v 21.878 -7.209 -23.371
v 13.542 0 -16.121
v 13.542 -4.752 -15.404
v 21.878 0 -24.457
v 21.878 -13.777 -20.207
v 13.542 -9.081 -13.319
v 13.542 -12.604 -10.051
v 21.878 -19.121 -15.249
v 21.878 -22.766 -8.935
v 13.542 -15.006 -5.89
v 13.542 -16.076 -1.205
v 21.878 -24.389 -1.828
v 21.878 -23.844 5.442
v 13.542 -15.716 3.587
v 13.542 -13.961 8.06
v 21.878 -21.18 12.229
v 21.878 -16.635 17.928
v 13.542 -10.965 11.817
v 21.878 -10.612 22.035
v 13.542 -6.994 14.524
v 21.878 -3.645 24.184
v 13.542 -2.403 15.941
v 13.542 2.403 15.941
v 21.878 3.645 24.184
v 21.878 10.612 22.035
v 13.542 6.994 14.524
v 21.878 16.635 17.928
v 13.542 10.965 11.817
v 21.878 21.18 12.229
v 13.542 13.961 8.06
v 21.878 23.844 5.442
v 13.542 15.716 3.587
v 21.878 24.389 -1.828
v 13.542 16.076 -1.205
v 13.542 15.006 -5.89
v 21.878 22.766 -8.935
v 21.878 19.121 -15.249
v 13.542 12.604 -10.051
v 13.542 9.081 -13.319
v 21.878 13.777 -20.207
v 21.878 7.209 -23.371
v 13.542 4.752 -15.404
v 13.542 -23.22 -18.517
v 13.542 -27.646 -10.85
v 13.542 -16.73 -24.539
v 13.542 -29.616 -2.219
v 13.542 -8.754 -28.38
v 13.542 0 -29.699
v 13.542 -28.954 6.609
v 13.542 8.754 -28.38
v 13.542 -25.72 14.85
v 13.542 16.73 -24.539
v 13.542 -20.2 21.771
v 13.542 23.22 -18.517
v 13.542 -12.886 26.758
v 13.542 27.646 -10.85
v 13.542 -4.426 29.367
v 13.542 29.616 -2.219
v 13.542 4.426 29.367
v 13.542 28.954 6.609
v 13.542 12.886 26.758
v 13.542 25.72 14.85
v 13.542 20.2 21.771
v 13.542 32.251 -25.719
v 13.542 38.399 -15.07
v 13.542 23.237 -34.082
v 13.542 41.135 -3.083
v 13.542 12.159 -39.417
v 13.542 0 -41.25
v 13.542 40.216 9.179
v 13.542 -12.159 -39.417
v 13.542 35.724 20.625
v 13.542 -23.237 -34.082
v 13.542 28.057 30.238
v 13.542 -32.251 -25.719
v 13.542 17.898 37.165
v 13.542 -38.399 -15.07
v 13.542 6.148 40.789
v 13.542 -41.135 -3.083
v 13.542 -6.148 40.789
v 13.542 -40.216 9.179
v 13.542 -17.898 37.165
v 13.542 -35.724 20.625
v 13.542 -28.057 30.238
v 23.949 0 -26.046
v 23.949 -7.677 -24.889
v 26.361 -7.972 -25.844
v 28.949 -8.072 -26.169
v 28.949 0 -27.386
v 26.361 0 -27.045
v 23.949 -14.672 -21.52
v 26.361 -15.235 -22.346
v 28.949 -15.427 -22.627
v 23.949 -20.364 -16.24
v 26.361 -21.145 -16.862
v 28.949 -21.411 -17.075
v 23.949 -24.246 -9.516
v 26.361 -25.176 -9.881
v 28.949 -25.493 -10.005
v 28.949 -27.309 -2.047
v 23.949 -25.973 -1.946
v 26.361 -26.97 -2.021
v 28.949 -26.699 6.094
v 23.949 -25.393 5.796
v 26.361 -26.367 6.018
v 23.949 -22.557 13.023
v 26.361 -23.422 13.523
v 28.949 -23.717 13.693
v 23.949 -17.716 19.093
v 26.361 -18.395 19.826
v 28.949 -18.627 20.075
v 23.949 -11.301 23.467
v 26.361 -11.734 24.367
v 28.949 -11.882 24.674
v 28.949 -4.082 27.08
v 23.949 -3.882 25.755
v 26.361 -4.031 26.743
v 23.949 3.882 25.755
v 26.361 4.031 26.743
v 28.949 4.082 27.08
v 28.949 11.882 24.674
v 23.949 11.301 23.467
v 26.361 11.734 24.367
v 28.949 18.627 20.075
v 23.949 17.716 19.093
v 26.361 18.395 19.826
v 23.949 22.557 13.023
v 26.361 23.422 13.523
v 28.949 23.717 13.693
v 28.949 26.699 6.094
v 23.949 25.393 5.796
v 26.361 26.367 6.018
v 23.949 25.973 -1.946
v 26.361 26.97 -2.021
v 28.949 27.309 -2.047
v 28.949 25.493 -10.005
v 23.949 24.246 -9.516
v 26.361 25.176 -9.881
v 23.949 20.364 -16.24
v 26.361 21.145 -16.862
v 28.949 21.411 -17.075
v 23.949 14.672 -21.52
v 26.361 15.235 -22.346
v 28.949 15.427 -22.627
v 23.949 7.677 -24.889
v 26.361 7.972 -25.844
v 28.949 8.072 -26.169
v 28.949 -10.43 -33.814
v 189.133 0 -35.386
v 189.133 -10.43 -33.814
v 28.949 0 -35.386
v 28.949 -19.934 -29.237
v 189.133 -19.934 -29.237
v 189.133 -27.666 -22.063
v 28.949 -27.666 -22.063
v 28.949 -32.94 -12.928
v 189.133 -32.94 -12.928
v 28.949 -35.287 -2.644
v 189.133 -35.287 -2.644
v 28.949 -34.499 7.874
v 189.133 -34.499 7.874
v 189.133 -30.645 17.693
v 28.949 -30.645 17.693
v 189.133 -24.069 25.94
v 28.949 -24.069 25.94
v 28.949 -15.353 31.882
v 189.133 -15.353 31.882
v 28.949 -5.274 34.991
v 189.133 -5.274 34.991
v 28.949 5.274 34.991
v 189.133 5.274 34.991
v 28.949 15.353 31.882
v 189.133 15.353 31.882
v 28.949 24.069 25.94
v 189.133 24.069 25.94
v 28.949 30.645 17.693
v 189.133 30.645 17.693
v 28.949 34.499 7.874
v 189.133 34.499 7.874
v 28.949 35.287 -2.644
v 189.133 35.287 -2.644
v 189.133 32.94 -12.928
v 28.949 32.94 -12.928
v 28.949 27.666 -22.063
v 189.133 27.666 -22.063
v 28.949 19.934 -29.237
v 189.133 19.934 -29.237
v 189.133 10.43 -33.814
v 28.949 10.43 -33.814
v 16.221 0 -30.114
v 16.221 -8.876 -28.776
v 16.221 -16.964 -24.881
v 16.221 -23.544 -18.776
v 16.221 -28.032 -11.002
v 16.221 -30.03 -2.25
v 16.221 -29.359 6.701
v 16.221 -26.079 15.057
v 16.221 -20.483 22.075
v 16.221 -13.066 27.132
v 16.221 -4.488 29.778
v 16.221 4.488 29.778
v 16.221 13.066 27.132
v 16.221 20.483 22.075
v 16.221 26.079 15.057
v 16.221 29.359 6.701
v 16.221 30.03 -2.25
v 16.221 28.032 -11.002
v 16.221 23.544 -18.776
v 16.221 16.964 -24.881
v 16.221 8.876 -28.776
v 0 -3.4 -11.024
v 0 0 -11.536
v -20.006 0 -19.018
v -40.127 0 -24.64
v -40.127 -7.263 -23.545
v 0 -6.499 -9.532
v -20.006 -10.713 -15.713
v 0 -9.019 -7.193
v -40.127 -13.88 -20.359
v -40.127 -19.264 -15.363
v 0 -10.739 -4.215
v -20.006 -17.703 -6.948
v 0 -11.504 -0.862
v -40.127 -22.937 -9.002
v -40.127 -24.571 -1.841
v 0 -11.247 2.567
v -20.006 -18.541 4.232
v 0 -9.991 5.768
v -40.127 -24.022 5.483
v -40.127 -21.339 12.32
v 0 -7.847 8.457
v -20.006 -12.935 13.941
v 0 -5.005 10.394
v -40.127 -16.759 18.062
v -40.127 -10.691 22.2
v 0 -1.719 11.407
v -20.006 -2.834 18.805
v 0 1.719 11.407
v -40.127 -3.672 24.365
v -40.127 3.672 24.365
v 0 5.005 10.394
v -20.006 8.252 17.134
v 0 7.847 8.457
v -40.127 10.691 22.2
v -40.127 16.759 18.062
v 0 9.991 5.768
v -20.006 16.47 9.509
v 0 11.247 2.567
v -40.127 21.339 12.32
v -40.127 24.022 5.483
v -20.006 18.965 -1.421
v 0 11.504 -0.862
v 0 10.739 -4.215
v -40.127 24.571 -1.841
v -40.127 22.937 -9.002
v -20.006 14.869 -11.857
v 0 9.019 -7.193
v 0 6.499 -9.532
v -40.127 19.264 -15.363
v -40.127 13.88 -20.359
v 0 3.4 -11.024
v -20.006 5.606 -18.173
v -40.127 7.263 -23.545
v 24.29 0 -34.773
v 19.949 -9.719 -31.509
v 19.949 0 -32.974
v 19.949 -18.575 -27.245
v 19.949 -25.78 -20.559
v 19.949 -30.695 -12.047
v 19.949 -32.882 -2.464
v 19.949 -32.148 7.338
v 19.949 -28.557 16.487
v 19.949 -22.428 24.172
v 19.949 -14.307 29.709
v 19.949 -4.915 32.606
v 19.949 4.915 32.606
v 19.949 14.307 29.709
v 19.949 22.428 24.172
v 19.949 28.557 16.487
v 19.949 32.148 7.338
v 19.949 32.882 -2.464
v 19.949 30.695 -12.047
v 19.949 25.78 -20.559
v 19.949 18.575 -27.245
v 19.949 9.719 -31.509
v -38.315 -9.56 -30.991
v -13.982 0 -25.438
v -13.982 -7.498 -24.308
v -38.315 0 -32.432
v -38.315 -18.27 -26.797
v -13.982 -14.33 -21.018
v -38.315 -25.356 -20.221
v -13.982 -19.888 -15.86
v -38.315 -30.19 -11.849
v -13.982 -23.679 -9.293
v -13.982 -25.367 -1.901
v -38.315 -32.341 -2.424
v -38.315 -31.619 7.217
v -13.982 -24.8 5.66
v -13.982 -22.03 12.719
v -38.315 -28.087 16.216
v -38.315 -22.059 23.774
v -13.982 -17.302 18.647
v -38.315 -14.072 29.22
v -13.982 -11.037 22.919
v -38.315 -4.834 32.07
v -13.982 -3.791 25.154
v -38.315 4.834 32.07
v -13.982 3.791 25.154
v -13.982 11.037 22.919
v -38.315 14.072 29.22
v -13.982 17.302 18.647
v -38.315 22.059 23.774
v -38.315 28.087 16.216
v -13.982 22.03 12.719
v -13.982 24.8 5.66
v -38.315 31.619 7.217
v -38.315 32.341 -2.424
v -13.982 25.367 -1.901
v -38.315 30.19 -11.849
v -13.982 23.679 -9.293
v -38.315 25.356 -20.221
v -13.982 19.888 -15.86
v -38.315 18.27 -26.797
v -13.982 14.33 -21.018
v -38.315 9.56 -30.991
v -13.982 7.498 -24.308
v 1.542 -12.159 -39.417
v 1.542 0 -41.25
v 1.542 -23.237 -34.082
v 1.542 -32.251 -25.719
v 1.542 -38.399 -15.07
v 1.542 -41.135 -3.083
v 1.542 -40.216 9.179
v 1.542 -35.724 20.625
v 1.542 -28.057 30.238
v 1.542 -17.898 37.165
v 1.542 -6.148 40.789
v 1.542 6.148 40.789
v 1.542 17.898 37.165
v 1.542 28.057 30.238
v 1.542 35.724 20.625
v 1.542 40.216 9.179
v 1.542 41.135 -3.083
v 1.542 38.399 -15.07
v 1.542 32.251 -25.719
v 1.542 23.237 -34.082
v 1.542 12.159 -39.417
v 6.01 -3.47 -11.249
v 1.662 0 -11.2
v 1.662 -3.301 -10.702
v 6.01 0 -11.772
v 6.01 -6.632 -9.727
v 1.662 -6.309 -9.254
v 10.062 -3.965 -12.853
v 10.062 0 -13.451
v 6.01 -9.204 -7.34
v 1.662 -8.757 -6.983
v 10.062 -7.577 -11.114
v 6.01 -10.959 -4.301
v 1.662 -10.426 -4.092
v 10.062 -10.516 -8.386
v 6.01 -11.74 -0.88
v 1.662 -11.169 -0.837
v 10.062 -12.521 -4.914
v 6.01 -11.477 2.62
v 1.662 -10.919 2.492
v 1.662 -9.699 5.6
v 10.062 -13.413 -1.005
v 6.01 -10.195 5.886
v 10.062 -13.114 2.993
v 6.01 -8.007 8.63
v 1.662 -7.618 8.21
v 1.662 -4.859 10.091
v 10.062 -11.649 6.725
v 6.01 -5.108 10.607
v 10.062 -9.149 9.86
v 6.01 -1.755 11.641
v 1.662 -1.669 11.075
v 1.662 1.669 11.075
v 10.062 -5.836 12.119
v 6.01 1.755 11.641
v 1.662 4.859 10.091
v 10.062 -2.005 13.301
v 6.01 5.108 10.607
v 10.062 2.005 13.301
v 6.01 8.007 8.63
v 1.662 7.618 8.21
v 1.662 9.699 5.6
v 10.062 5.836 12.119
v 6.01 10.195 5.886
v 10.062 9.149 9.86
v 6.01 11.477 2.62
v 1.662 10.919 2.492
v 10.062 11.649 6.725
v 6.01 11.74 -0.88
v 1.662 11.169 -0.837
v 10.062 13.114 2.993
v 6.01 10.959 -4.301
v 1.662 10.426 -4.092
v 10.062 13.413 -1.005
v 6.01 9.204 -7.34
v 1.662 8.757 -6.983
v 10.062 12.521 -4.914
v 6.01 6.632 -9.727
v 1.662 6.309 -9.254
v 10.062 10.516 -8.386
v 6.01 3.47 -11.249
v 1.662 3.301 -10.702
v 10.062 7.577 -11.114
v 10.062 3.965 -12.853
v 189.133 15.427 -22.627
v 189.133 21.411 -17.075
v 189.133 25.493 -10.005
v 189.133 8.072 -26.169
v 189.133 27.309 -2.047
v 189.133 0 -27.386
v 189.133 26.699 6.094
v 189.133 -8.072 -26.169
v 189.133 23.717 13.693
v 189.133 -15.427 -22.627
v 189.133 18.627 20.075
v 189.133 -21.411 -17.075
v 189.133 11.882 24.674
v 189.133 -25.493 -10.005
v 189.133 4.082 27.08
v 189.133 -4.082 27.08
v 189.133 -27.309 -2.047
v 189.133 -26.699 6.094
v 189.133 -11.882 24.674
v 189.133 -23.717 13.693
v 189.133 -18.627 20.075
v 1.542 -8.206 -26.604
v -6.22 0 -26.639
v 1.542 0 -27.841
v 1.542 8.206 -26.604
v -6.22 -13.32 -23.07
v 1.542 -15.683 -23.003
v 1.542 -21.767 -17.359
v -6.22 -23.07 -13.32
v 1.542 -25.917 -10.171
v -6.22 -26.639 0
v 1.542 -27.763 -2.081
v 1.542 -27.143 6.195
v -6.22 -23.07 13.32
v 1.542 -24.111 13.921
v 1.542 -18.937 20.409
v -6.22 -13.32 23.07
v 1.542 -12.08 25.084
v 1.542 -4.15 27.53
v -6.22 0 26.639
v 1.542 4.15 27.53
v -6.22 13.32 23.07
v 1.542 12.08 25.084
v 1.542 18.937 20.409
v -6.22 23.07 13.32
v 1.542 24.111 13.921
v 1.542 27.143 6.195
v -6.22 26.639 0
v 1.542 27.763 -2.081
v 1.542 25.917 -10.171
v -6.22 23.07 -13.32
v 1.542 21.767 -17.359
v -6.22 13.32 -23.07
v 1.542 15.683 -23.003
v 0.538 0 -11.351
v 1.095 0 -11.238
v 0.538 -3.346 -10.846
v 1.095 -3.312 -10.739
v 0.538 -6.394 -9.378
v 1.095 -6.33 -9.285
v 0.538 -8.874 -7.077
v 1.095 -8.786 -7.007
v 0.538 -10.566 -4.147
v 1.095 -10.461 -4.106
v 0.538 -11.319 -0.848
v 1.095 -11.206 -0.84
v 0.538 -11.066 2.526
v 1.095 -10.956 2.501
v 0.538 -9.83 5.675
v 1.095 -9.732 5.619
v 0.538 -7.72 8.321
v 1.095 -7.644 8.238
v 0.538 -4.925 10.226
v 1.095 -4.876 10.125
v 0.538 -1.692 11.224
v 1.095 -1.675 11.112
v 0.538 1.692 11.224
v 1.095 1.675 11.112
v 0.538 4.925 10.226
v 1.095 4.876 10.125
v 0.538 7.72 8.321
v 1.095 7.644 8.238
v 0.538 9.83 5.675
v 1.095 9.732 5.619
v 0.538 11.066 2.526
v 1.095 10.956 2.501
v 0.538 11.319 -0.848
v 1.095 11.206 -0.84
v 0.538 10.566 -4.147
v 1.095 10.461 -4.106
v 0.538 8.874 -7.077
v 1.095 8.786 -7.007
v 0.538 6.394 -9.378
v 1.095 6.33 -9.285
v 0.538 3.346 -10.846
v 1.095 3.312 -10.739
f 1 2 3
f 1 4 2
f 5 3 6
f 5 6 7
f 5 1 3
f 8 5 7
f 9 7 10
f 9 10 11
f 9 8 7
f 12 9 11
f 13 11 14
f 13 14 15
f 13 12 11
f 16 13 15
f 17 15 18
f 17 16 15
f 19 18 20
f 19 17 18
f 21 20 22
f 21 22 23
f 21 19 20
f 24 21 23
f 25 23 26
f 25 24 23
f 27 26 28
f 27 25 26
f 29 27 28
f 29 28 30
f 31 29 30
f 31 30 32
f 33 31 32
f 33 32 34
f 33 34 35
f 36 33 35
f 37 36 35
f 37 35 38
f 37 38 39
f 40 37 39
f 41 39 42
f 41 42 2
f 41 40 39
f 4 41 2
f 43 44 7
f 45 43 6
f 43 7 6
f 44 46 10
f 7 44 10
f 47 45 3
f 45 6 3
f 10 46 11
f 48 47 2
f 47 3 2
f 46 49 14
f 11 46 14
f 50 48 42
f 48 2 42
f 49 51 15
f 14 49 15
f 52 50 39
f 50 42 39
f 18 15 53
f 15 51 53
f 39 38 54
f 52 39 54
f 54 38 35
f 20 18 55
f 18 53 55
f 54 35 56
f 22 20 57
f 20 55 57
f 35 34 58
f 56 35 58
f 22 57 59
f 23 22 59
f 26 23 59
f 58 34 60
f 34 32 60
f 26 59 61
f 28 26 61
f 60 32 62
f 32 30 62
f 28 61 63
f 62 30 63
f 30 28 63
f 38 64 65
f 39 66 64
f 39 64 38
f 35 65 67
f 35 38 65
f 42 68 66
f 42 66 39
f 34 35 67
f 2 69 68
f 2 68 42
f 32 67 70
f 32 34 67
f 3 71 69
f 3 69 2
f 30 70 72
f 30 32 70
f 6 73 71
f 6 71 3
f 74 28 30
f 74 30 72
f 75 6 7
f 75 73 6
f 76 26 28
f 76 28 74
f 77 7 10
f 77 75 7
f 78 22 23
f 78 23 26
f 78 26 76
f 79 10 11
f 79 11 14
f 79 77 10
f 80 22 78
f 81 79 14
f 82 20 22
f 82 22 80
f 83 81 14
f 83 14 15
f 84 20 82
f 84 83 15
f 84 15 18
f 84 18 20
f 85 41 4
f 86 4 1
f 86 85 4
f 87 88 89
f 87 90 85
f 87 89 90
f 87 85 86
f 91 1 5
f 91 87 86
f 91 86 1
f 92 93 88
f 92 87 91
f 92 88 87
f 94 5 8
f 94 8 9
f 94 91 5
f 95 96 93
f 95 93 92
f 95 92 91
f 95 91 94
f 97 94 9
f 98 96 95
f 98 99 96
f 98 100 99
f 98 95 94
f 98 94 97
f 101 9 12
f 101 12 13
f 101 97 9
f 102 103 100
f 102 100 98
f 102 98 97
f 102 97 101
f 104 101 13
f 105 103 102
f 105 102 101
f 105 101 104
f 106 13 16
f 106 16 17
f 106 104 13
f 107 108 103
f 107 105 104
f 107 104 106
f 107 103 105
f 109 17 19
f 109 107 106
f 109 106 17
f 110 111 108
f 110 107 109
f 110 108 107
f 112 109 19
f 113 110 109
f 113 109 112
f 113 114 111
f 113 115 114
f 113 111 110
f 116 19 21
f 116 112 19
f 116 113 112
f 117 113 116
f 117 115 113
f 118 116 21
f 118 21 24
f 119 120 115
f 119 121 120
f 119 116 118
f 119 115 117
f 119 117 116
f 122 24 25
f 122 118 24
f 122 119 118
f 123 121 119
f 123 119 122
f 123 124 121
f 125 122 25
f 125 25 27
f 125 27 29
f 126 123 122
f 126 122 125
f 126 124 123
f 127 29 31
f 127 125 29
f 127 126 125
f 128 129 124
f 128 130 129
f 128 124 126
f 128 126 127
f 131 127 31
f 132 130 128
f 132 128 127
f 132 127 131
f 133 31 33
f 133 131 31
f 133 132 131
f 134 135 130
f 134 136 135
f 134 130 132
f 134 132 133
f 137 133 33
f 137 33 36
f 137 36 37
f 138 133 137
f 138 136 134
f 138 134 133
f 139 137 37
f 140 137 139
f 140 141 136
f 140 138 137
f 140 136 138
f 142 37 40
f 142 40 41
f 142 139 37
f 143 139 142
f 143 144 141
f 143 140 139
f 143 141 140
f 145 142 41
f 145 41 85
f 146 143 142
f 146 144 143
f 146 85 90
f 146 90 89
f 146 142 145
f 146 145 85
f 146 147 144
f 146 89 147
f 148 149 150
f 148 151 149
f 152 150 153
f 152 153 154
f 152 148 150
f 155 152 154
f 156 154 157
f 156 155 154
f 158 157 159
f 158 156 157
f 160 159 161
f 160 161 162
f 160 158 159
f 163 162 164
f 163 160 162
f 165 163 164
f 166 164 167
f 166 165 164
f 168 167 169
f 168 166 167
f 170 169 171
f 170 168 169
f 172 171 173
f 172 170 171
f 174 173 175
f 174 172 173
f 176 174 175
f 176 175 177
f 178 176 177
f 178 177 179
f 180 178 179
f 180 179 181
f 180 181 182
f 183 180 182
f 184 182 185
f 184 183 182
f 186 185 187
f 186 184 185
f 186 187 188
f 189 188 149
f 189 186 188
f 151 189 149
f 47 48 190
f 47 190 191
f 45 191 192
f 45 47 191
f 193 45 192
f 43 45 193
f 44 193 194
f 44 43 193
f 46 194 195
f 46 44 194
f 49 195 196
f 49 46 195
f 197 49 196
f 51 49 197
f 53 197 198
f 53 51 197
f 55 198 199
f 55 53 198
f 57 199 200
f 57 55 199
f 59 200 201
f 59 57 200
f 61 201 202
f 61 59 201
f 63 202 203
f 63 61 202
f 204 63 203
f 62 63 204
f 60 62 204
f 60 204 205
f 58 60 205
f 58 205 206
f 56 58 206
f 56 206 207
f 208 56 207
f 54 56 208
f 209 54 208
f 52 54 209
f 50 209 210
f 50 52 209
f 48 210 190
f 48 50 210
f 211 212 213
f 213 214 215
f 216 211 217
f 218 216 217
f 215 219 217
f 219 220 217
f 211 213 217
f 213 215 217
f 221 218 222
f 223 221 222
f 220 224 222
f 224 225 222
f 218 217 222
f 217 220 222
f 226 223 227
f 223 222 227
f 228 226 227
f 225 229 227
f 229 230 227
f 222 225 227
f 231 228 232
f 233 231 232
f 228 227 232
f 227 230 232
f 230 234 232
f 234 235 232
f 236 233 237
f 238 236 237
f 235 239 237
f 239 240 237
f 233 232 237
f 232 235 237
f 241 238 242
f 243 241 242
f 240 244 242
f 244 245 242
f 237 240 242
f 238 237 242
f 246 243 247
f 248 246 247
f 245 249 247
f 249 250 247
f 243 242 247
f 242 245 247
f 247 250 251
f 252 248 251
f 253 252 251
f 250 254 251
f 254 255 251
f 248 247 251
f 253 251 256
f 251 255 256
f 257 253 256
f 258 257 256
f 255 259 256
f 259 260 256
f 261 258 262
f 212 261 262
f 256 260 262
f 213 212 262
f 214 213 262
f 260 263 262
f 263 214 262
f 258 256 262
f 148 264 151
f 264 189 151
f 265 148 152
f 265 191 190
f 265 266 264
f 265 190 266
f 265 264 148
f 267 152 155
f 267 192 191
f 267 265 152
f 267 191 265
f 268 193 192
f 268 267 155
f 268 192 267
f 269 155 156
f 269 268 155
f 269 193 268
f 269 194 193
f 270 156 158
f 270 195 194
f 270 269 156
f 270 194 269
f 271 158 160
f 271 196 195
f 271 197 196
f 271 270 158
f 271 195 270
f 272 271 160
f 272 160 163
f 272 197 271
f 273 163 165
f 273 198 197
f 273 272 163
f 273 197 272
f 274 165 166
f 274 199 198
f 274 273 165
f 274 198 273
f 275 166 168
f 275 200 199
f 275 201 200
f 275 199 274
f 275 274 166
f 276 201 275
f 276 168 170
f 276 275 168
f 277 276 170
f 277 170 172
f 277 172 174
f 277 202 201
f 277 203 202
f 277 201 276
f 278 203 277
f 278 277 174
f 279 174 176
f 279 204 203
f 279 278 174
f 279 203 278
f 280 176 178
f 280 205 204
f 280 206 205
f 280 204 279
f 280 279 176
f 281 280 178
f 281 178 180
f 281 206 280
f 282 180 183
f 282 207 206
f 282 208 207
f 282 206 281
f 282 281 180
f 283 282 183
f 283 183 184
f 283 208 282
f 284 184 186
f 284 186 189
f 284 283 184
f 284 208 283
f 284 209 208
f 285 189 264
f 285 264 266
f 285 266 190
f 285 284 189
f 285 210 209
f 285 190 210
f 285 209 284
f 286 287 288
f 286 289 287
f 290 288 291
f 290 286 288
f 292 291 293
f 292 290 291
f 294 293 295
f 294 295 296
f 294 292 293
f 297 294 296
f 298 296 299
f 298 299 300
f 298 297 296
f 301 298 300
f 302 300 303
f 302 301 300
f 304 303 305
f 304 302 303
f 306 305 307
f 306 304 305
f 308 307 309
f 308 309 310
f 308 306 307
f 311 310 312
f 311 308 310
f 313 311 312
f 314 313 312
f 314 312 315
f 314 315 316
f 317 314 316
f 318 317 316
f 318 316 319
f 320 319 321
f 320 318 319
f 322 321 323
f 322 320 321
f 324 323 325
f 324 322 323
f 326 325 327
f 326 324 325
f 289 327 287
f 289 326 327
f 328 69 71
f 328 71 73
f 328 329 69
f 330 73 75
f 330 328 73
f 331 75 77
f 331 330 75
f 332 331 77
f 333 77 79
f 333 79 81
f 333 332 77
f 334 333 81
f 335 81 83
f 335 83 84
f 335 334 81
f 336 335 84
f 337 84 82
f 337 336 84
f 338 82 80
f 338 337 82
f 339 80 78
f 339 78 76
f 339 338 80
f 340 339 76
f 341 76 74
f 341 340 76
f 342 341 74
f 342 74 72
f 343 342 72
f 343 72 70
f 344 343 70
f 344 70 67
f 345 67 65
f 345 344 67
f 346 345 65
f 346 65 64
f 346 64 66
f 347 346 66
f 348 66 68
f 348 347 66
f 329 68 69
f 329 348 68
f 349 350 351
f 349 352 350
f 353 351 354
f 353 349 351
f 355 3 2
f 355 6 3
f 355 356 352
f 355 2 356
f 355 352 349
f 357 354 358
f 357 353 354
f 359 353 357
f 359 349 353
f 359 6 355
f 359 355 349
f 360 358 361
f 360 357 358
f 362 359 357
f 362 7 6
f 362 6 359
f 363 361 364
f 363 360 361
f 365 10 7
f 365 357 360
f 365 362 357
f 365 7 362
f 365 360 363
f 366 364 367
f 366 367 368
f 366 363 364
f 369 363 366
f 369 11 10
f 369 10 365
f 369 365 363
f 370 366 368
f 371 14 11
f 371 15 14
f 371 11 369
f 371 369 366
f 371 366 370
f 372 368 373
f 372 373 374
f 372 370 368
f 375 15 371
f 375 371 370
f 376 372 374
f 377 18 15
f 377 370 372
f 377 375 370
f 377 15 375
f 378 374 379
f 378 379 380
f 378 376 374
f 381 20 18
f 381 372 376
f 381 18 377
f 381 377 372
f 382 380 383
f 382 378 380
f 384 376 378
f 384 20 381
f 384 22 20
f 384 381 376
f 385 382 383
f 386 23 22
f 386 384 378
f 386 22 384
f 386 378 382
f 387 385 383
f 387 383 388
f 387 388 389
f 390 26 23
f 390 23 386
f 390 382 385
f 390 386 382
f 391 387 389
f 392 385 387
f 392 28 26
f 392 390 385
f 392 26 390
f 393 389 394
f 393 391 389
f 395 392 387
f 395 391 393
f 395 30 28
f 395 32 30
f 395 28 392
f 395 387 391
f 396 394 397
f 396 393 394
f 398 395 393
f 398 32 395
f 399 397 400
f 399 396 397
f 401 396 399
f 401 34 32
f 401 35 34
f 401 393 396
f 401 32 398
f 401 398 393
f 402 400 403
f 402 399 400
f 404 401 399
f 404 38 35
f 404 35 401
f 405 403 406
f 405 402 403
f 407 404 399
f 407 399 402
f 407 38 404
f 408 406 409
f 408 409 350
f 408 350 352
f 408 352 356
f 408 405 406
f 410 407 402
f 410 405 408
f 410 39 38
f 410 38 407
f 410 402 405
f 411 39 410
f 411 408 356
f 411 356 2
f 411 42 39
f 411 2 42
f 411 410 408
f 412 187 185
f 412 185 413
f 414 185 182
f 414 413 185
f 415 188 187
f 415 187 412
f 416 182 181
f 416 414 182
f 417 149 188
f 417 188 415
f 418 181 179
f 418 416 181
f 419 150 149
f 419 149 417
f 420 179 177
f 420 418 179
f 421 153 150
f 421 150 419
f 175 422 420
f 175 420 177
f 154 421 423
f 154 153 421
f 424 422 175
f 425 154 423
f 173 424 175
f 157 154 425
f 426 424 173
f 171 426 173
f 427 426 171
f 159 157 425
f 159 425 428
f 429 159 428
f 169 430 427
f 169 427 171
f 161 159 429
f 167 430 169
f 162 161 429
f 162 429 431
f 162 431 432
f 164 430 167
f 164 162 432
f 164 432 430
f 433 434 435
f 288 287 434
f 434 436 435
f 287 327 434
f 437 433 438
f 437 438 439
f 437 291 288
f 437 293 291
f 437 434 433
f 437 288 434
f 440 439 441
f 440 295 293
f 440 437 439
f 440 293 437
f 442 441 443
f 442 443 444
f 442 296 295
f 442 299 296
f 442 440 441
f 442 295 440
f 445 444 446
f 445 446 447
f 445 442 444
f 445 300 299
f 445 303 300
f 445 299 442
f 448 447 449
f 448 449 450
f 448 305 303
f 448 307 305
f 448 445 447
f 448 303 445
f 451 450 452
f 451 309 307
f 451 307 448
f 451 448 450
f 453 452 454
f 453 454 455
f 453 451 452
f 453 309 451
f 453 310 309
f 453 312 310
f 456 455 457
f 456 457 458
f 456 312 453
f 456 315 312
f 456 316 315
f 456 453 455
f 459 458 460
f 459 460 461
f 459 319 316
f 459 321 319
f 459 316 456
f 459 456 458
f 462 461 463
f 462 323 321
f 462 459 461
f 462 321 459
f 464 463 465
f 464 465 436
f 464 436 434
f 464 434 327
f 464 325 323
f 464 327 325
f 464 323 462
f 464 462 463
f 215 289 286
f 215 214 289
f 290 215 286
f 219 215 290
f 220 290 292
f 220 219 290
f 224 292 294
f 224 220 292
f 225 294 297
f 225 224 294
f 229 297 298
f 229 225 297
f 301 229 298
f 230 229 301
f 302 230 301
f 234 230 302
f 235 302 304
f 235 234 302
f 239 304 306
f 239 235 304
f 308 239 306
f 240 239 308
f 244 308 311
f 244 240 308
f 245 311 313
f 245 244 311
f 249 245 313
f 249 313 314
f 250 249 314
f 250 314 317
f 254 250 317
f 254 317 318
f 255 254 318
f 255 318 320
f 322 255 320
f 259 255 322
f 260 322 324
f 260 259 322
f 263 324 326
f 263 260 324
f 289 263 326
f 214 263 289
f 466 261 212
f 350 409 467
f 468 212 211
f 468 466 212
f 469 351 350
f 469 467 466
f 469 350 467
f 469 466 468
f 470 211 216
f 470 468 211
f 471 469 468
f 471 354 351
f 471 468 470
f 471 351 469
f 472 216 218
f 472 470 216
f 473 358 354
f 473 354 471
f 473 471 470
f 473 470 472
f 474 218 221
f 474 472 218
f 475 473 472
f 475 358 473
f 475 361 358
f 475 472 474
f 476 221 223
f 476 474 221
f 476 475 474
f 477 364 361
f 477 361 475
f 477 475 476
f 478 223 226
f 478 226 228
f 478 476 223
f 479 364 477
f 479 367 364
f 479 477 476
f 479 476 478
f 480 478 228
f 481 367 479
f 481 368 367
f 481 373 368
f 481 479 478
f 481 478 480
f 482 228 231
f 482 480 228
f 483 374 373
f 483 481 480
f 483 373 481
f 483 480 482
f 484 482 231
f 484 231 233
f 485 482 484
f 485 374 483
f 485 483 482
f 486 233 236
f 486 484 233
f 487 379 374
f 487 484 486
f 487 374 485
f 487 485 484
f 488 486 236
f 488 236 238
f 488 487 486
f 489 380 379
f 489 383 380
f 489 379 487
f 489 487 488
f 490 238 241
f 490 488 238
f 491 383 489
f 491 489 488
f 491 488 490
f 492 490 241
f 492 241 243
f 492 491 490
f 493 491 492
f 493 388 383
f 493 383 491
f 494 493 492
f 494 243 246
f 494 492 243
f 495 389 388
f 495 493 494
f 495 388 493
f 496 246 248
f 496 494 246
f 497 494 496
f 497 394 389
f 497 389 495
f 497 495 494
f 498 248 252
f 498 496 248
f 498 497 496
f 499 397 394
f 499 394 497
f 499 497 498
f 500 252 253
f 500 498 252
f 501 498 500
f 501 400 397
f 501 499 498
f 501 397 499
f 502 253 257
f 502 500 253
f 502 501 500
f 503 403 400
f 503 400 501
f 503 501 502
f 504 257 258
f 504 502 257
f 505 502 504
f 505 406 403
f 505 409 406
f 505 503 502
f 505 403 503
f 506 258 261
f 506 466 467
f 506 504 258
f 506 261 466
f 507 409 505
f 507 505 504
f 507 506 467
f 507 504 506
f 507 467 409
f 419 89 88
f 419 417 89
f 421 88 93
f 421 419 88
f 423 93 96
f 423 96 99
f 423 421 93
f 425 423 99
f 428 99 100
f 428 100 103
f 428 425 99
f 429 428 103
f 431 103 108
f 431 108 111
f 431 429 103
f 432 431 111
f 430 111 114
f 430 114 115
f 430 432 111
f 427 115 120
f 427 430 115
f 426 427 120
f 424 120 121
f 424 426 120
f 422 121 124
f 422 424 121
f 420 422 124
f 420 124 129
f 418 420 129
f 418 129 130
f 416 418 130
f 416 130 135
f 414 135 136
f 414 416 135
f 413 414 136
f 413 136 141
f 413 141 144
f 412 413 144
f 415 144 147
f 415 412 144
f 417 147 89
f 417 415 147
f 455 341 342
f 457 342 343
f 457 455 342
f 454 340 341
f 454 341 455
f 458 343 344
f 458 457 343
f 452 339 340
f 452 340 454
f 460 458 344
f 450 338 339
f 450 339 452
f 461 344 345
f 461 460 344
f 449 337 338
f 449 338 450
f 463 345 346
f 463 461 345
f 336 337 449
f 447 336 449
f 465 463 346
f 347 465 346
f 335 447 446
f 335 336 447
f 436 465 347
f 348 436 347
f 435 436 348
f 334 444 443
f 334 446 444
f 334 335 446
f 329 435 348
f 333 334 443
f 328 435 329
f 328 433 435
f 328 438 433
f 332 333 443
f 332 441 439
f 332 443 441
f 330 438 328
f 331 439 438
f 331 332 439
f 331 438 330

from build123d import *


with BuildPart() as part:
    # Sketch1 → Revolve1 (revolve)
    with BuildSketch(Plane.XY):
        with BuildLine():
            Line((28.949236933, 27.386004017), (189.133015331, 27.386004017))
            Line((189.133015331, 27.386004017), (189.133015331, 35.386004017))
            Line((189.133015331, 35.386004017), (28.949236933, 35.386004017))
            ThreePointArc((28.949236933, 35.386004017), (22.060935151, 34.015835602), (16.221314872, 30.113926078))
            Line((16.221314872, 30.113926078), (-13.981586934, 25.437652311))
            add(Edge.make_bspline(
                [(-13.981586934, 25.437652311), (-16.029314719, 26.139512712), (-28.160190772, 30.070121673), (-38.315022829, 32.432092239)],
                knots=[0.414468937, 0.414468937, 0.414468937, 0.513462719, 1, 1, 1], degree=2))
            Line((-38.315022829, 32.432092239), (-40.127010283, 24.64))
            add(Edge.make_bspline(
                [(0, 11.536137468), (-19.948257354, 19.947595697), (-40.127010283, 24.64)],
                knots=[0, 0, 0, 1, 1, 1], degree=2))
            ThreePointArc((0, 11.536137468), (0.81433228, 11.284876268), (1.662309445, 11.2))
            ThreePointArc((1.662309445, 11.2), (8.091391109, 12.478823854), (13.541703369, 16.120606076))
            Line((13.541703369, 16.120606076), (21.878169121, 24.457071829))
            ThreePointArc((21.878169121, 24.457071829), (25.12240261, 26.624799342), (28.949236933, 27.386004017))
        make_face()
    revolve(axis=Axis((0, 0, 0), (-1, 0, 0)))

    # Sketch3 → Revolve2 (revolve)
    with BuildSketch(Plane.XY):
        with BuildLine():
            Line((7.884849119, 21.777460326), (13.541703369, 27.434314575))
            Line((13.541703369, 27.434314575), (13.541703369, 41.25))
            Line((13.541703369, 41.25), (1.541703369, 41.25))
            Line((1.541703369, 41.25), (1.541703369, 19.562467336))
            add(Edge.make_bspline(
                [(2.348184674, 19.226769399), (1.945008818, 19.395347937), (1.541703369, 19.562467336)],
                knots=[0.018493807, 0.018493807, 0.018493807, 0.038110015, 0.038110015, 0.038110015], degree=2))
            ThreePointArc((2.348184674, 19.226769399), (5.344435892, 20.007381854), (7.884849119, 21.777460326))
        make_face()
    revolve(axis=Axis((0, 0, 0), (-1, 0, 0)))


with BuildPart() as body_2:
    # Split1: the piece on the far side of the plane
    add(part.part)
    split(bisect_by=Plane(origin=(13.541703369, 0, 0), x_dir=(0, 0, 1), z_dir=(1, 0, 0)), keep=Keep.BOTTOM)


with BuildPart() as part_1:
    add(part.part)

    # Split1
    split(bisect_by=Plane(origin=(13.541703369, 0, 0), x_dir=(0, 0, 1), z_dir=(1, 0, 0)), keep=Keep.TOP)


solid = Compound([body_2.part, part_1.part])
